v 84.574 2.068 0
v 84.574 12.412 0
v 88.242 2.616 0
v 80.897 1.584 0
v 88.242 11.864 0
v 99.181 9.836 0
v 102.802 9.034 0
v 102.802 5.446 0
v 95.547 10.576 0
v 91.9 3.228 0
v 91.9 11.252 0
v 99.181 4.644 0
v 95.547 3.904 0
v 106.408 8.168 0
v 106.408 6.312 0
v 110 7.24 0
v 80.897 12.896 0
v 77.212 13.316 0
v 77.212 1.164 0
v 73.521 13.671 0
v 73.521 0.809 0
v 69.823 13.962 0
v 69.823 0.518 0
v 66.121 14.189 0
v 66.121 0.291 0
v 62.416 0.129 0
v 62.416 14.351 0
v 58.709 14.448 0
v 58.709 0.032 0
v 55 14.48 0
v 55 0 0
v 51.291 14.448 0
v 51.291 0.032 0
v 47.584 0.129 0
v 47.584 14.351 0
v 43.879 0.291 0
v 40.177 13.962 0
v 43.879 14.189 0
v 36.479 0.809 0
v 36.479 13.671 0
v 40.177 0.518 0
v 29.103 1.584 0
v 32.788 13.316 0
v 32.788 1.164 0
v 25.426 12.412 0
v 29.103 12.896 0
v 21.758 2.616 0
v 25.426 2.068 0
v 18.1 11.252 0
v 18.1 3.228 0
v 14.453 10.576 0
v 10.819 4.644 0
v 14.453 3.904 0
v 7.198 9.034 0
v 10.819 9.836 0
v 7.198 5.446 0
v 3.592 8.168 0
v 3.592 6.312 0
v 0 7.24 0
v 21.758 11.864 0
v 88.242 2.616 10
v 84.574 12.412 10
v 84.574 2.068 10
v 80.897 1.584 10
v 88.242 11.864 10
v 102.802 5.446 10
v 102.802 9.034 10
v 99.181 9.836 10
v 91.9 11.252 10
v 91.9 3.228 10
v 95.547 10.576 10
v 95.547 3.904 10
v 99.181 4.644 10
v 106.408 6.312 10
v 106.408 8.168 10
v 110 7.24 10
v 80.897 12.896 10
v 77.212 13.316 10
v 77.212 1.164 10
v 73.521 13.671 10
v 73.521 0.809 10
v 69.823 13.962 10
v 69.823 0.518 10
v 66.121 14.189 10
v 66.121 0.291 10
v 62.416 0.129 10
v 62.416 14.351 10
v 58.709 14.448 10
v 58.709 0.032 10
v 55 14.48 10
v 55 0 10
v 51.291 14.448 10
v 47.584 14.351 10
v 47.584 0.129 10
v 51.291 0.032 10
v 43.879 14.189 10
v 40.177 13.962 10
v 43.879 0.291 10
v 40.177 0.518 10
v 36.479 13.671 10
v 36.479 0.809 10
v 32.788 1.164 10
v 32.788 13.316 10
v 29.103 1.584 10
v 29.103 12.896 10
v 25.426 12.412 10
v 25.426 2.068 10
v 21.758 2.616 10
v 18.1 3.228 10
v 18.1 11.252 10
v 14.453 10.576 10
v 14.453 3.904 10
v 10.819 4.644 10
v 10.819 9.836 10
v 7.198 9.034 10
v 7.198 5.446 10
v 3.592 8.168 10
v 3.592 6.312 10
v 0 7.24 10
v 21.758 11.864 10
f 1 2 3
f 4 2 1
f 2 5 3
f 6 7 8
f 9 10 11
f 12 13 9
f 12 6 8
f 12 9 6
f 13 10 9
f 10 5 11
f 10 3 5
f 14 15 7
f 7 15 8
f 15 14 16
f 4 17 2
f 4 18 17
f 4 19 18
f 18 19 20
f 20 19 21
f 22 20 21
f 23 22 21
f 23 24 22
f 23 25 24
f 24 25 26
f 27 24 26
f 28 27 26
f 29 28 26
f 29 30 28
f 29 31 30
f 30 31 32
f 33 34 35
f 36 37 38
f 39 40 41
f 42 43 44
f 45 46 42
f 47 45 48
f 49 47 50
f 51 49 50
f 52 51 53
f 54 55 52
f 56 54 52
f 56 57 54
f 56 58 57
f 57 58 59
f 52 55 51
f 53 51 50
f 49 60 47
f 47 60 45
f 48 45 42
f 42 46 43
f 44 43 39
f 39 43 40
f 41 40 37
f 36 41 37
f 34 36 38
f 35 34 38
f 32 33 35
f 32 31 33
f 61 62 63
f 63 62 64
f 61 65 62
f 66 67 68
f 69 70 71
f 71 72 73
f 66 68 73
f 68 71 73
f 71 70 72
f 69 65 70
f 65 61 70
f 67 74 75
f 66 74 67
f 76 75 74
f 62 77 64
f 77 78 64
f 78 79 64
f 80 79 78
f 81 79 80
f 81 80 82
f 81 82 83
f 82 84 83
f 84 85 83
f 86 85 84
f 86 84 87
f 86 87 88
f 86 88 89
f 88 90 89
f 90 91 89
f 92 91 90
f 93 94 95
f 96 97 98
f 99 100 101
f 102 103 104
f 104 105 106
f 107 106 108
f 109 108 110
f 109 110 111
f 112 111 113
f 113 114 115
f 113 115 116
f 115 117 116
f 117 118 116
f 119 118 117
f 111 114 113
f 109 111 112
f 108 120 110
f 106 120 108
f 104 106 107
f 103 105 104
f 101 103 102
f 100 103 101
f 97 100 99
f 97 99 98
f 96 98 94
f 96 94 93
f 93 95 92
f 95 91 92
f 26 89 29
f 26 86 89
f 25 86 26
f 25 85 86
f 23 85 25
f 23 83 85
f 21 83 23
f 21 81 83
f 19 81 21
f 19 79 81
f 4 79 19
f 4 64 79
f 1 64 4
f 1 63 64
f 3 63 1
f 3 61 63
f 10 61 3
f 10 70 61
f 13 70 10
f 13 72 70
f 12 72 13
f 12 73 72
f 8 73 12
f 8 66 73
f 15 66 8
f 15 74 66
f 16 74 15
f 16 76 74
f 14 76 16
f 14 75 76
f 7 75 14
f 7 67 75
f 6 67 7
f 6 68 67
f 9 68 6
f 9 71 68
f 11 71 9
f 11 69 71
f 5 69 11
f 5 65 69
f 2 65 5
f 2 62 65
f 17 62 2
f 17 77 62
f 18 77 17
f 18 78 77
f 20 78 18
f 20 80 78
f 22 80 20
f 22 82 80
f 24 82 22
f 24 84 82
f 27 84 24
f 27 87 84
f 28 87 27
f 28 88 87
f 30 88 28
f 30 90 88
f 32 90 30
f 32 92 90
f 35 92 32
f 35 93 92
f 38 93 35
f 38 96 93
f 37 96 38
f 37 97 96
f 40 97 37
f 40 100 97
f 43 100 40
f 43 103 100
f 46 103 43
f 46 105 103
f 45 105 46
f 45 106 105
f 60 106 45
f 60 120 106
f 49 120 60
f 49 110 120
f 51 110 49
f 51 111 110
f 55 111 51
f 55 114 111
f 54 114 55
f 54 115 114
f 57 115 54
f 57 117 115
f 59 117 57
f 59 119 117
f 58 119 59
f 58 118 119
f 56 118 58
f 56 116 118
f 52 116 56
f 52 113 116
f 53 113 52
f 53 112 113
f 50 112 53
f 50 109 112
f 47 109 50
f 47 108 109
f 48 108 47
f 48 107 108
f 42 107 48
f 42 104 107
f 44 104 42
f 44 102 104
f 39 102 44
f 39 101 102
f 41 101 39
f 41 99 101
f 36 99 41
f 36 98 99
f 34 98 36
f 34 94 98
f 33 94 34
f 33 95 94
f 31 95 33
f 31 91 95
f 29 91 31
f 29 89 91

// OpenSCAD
$fn = 32;

// ----------------------------------------------------------------------
// Arc profile plate: lens, 60 points
// ----------------------------------------------------------------------

// --- parameters (mm) ---
lens_chord = 110;         // chord length of the lens, X
arc_r = 212.5;            // radius of both arcs
arc_angle = 30;           // angle of each arc, degrees
sagitta = 7.24;           // bulge of each arc (half the lens height)
arc_step = 1;             // sampling step of the arcs, degrees
plate_t = 10;             // plate thickness, Z

bbox_y = 2 * sagitta;  // full lens height

profile = [[110, 7.24], [106.408, 8.168], [102.802, 9.034], [99.181, 9.836], [95.547, 10.576], [91.9, 11.252], [88.242, 11.864], [84.574, 12.412], [80.897, 12.896], [77.212, 13.316], [73.521, 13.671], [69.823, 13.962], [66.121, 14.189], [62.416, 14.351], [58.709, 14.448], [55, 14.48], [51.291, 14.448], [47.584, 14.351], [43.879, 14.189], [40.177, 13.962], [36.479, 13.671], [32.788, 13.316], [29.103, 12.896], [25.426, 12.412], [21.758, 11.864], [18.1, 11.252], [14.453, 10.576], [10.819, 9.836], [7.198, 9.034], [3.592, 8.168], [0, 7.24], [3.592, 6.312], [7.198, 5.446], [10.819, 4.644], [14.453, 3.904], [18.1, 3.228], [21.758, 2.616], [25.426, 2.068], [29.103, 1.584], [32.788, 1.164], [36.479, 0.809], [40.177, 0.518], [43.879, 0.291], [47.584, 0.129], [51.291, 0.032], [55, 0], [58.709, 0.032], [62.416, 0.129], [66.121, 0.291], [69.823, 0.518], [73.521, 0.809], [77.212, 1.164], [80.897, 1.584], [84.574, 2.068], [88.242, 2.616], [91.9, 3.228], [95.547, 3.904], [99.181, 4.644], [102.802, 5.446], [106.408, 6.312]];  // primary outline, 60 points, counter clockwise

// --- the one profile operation ---
linear_extrude(height = plate_t) polygon(points = profile);
